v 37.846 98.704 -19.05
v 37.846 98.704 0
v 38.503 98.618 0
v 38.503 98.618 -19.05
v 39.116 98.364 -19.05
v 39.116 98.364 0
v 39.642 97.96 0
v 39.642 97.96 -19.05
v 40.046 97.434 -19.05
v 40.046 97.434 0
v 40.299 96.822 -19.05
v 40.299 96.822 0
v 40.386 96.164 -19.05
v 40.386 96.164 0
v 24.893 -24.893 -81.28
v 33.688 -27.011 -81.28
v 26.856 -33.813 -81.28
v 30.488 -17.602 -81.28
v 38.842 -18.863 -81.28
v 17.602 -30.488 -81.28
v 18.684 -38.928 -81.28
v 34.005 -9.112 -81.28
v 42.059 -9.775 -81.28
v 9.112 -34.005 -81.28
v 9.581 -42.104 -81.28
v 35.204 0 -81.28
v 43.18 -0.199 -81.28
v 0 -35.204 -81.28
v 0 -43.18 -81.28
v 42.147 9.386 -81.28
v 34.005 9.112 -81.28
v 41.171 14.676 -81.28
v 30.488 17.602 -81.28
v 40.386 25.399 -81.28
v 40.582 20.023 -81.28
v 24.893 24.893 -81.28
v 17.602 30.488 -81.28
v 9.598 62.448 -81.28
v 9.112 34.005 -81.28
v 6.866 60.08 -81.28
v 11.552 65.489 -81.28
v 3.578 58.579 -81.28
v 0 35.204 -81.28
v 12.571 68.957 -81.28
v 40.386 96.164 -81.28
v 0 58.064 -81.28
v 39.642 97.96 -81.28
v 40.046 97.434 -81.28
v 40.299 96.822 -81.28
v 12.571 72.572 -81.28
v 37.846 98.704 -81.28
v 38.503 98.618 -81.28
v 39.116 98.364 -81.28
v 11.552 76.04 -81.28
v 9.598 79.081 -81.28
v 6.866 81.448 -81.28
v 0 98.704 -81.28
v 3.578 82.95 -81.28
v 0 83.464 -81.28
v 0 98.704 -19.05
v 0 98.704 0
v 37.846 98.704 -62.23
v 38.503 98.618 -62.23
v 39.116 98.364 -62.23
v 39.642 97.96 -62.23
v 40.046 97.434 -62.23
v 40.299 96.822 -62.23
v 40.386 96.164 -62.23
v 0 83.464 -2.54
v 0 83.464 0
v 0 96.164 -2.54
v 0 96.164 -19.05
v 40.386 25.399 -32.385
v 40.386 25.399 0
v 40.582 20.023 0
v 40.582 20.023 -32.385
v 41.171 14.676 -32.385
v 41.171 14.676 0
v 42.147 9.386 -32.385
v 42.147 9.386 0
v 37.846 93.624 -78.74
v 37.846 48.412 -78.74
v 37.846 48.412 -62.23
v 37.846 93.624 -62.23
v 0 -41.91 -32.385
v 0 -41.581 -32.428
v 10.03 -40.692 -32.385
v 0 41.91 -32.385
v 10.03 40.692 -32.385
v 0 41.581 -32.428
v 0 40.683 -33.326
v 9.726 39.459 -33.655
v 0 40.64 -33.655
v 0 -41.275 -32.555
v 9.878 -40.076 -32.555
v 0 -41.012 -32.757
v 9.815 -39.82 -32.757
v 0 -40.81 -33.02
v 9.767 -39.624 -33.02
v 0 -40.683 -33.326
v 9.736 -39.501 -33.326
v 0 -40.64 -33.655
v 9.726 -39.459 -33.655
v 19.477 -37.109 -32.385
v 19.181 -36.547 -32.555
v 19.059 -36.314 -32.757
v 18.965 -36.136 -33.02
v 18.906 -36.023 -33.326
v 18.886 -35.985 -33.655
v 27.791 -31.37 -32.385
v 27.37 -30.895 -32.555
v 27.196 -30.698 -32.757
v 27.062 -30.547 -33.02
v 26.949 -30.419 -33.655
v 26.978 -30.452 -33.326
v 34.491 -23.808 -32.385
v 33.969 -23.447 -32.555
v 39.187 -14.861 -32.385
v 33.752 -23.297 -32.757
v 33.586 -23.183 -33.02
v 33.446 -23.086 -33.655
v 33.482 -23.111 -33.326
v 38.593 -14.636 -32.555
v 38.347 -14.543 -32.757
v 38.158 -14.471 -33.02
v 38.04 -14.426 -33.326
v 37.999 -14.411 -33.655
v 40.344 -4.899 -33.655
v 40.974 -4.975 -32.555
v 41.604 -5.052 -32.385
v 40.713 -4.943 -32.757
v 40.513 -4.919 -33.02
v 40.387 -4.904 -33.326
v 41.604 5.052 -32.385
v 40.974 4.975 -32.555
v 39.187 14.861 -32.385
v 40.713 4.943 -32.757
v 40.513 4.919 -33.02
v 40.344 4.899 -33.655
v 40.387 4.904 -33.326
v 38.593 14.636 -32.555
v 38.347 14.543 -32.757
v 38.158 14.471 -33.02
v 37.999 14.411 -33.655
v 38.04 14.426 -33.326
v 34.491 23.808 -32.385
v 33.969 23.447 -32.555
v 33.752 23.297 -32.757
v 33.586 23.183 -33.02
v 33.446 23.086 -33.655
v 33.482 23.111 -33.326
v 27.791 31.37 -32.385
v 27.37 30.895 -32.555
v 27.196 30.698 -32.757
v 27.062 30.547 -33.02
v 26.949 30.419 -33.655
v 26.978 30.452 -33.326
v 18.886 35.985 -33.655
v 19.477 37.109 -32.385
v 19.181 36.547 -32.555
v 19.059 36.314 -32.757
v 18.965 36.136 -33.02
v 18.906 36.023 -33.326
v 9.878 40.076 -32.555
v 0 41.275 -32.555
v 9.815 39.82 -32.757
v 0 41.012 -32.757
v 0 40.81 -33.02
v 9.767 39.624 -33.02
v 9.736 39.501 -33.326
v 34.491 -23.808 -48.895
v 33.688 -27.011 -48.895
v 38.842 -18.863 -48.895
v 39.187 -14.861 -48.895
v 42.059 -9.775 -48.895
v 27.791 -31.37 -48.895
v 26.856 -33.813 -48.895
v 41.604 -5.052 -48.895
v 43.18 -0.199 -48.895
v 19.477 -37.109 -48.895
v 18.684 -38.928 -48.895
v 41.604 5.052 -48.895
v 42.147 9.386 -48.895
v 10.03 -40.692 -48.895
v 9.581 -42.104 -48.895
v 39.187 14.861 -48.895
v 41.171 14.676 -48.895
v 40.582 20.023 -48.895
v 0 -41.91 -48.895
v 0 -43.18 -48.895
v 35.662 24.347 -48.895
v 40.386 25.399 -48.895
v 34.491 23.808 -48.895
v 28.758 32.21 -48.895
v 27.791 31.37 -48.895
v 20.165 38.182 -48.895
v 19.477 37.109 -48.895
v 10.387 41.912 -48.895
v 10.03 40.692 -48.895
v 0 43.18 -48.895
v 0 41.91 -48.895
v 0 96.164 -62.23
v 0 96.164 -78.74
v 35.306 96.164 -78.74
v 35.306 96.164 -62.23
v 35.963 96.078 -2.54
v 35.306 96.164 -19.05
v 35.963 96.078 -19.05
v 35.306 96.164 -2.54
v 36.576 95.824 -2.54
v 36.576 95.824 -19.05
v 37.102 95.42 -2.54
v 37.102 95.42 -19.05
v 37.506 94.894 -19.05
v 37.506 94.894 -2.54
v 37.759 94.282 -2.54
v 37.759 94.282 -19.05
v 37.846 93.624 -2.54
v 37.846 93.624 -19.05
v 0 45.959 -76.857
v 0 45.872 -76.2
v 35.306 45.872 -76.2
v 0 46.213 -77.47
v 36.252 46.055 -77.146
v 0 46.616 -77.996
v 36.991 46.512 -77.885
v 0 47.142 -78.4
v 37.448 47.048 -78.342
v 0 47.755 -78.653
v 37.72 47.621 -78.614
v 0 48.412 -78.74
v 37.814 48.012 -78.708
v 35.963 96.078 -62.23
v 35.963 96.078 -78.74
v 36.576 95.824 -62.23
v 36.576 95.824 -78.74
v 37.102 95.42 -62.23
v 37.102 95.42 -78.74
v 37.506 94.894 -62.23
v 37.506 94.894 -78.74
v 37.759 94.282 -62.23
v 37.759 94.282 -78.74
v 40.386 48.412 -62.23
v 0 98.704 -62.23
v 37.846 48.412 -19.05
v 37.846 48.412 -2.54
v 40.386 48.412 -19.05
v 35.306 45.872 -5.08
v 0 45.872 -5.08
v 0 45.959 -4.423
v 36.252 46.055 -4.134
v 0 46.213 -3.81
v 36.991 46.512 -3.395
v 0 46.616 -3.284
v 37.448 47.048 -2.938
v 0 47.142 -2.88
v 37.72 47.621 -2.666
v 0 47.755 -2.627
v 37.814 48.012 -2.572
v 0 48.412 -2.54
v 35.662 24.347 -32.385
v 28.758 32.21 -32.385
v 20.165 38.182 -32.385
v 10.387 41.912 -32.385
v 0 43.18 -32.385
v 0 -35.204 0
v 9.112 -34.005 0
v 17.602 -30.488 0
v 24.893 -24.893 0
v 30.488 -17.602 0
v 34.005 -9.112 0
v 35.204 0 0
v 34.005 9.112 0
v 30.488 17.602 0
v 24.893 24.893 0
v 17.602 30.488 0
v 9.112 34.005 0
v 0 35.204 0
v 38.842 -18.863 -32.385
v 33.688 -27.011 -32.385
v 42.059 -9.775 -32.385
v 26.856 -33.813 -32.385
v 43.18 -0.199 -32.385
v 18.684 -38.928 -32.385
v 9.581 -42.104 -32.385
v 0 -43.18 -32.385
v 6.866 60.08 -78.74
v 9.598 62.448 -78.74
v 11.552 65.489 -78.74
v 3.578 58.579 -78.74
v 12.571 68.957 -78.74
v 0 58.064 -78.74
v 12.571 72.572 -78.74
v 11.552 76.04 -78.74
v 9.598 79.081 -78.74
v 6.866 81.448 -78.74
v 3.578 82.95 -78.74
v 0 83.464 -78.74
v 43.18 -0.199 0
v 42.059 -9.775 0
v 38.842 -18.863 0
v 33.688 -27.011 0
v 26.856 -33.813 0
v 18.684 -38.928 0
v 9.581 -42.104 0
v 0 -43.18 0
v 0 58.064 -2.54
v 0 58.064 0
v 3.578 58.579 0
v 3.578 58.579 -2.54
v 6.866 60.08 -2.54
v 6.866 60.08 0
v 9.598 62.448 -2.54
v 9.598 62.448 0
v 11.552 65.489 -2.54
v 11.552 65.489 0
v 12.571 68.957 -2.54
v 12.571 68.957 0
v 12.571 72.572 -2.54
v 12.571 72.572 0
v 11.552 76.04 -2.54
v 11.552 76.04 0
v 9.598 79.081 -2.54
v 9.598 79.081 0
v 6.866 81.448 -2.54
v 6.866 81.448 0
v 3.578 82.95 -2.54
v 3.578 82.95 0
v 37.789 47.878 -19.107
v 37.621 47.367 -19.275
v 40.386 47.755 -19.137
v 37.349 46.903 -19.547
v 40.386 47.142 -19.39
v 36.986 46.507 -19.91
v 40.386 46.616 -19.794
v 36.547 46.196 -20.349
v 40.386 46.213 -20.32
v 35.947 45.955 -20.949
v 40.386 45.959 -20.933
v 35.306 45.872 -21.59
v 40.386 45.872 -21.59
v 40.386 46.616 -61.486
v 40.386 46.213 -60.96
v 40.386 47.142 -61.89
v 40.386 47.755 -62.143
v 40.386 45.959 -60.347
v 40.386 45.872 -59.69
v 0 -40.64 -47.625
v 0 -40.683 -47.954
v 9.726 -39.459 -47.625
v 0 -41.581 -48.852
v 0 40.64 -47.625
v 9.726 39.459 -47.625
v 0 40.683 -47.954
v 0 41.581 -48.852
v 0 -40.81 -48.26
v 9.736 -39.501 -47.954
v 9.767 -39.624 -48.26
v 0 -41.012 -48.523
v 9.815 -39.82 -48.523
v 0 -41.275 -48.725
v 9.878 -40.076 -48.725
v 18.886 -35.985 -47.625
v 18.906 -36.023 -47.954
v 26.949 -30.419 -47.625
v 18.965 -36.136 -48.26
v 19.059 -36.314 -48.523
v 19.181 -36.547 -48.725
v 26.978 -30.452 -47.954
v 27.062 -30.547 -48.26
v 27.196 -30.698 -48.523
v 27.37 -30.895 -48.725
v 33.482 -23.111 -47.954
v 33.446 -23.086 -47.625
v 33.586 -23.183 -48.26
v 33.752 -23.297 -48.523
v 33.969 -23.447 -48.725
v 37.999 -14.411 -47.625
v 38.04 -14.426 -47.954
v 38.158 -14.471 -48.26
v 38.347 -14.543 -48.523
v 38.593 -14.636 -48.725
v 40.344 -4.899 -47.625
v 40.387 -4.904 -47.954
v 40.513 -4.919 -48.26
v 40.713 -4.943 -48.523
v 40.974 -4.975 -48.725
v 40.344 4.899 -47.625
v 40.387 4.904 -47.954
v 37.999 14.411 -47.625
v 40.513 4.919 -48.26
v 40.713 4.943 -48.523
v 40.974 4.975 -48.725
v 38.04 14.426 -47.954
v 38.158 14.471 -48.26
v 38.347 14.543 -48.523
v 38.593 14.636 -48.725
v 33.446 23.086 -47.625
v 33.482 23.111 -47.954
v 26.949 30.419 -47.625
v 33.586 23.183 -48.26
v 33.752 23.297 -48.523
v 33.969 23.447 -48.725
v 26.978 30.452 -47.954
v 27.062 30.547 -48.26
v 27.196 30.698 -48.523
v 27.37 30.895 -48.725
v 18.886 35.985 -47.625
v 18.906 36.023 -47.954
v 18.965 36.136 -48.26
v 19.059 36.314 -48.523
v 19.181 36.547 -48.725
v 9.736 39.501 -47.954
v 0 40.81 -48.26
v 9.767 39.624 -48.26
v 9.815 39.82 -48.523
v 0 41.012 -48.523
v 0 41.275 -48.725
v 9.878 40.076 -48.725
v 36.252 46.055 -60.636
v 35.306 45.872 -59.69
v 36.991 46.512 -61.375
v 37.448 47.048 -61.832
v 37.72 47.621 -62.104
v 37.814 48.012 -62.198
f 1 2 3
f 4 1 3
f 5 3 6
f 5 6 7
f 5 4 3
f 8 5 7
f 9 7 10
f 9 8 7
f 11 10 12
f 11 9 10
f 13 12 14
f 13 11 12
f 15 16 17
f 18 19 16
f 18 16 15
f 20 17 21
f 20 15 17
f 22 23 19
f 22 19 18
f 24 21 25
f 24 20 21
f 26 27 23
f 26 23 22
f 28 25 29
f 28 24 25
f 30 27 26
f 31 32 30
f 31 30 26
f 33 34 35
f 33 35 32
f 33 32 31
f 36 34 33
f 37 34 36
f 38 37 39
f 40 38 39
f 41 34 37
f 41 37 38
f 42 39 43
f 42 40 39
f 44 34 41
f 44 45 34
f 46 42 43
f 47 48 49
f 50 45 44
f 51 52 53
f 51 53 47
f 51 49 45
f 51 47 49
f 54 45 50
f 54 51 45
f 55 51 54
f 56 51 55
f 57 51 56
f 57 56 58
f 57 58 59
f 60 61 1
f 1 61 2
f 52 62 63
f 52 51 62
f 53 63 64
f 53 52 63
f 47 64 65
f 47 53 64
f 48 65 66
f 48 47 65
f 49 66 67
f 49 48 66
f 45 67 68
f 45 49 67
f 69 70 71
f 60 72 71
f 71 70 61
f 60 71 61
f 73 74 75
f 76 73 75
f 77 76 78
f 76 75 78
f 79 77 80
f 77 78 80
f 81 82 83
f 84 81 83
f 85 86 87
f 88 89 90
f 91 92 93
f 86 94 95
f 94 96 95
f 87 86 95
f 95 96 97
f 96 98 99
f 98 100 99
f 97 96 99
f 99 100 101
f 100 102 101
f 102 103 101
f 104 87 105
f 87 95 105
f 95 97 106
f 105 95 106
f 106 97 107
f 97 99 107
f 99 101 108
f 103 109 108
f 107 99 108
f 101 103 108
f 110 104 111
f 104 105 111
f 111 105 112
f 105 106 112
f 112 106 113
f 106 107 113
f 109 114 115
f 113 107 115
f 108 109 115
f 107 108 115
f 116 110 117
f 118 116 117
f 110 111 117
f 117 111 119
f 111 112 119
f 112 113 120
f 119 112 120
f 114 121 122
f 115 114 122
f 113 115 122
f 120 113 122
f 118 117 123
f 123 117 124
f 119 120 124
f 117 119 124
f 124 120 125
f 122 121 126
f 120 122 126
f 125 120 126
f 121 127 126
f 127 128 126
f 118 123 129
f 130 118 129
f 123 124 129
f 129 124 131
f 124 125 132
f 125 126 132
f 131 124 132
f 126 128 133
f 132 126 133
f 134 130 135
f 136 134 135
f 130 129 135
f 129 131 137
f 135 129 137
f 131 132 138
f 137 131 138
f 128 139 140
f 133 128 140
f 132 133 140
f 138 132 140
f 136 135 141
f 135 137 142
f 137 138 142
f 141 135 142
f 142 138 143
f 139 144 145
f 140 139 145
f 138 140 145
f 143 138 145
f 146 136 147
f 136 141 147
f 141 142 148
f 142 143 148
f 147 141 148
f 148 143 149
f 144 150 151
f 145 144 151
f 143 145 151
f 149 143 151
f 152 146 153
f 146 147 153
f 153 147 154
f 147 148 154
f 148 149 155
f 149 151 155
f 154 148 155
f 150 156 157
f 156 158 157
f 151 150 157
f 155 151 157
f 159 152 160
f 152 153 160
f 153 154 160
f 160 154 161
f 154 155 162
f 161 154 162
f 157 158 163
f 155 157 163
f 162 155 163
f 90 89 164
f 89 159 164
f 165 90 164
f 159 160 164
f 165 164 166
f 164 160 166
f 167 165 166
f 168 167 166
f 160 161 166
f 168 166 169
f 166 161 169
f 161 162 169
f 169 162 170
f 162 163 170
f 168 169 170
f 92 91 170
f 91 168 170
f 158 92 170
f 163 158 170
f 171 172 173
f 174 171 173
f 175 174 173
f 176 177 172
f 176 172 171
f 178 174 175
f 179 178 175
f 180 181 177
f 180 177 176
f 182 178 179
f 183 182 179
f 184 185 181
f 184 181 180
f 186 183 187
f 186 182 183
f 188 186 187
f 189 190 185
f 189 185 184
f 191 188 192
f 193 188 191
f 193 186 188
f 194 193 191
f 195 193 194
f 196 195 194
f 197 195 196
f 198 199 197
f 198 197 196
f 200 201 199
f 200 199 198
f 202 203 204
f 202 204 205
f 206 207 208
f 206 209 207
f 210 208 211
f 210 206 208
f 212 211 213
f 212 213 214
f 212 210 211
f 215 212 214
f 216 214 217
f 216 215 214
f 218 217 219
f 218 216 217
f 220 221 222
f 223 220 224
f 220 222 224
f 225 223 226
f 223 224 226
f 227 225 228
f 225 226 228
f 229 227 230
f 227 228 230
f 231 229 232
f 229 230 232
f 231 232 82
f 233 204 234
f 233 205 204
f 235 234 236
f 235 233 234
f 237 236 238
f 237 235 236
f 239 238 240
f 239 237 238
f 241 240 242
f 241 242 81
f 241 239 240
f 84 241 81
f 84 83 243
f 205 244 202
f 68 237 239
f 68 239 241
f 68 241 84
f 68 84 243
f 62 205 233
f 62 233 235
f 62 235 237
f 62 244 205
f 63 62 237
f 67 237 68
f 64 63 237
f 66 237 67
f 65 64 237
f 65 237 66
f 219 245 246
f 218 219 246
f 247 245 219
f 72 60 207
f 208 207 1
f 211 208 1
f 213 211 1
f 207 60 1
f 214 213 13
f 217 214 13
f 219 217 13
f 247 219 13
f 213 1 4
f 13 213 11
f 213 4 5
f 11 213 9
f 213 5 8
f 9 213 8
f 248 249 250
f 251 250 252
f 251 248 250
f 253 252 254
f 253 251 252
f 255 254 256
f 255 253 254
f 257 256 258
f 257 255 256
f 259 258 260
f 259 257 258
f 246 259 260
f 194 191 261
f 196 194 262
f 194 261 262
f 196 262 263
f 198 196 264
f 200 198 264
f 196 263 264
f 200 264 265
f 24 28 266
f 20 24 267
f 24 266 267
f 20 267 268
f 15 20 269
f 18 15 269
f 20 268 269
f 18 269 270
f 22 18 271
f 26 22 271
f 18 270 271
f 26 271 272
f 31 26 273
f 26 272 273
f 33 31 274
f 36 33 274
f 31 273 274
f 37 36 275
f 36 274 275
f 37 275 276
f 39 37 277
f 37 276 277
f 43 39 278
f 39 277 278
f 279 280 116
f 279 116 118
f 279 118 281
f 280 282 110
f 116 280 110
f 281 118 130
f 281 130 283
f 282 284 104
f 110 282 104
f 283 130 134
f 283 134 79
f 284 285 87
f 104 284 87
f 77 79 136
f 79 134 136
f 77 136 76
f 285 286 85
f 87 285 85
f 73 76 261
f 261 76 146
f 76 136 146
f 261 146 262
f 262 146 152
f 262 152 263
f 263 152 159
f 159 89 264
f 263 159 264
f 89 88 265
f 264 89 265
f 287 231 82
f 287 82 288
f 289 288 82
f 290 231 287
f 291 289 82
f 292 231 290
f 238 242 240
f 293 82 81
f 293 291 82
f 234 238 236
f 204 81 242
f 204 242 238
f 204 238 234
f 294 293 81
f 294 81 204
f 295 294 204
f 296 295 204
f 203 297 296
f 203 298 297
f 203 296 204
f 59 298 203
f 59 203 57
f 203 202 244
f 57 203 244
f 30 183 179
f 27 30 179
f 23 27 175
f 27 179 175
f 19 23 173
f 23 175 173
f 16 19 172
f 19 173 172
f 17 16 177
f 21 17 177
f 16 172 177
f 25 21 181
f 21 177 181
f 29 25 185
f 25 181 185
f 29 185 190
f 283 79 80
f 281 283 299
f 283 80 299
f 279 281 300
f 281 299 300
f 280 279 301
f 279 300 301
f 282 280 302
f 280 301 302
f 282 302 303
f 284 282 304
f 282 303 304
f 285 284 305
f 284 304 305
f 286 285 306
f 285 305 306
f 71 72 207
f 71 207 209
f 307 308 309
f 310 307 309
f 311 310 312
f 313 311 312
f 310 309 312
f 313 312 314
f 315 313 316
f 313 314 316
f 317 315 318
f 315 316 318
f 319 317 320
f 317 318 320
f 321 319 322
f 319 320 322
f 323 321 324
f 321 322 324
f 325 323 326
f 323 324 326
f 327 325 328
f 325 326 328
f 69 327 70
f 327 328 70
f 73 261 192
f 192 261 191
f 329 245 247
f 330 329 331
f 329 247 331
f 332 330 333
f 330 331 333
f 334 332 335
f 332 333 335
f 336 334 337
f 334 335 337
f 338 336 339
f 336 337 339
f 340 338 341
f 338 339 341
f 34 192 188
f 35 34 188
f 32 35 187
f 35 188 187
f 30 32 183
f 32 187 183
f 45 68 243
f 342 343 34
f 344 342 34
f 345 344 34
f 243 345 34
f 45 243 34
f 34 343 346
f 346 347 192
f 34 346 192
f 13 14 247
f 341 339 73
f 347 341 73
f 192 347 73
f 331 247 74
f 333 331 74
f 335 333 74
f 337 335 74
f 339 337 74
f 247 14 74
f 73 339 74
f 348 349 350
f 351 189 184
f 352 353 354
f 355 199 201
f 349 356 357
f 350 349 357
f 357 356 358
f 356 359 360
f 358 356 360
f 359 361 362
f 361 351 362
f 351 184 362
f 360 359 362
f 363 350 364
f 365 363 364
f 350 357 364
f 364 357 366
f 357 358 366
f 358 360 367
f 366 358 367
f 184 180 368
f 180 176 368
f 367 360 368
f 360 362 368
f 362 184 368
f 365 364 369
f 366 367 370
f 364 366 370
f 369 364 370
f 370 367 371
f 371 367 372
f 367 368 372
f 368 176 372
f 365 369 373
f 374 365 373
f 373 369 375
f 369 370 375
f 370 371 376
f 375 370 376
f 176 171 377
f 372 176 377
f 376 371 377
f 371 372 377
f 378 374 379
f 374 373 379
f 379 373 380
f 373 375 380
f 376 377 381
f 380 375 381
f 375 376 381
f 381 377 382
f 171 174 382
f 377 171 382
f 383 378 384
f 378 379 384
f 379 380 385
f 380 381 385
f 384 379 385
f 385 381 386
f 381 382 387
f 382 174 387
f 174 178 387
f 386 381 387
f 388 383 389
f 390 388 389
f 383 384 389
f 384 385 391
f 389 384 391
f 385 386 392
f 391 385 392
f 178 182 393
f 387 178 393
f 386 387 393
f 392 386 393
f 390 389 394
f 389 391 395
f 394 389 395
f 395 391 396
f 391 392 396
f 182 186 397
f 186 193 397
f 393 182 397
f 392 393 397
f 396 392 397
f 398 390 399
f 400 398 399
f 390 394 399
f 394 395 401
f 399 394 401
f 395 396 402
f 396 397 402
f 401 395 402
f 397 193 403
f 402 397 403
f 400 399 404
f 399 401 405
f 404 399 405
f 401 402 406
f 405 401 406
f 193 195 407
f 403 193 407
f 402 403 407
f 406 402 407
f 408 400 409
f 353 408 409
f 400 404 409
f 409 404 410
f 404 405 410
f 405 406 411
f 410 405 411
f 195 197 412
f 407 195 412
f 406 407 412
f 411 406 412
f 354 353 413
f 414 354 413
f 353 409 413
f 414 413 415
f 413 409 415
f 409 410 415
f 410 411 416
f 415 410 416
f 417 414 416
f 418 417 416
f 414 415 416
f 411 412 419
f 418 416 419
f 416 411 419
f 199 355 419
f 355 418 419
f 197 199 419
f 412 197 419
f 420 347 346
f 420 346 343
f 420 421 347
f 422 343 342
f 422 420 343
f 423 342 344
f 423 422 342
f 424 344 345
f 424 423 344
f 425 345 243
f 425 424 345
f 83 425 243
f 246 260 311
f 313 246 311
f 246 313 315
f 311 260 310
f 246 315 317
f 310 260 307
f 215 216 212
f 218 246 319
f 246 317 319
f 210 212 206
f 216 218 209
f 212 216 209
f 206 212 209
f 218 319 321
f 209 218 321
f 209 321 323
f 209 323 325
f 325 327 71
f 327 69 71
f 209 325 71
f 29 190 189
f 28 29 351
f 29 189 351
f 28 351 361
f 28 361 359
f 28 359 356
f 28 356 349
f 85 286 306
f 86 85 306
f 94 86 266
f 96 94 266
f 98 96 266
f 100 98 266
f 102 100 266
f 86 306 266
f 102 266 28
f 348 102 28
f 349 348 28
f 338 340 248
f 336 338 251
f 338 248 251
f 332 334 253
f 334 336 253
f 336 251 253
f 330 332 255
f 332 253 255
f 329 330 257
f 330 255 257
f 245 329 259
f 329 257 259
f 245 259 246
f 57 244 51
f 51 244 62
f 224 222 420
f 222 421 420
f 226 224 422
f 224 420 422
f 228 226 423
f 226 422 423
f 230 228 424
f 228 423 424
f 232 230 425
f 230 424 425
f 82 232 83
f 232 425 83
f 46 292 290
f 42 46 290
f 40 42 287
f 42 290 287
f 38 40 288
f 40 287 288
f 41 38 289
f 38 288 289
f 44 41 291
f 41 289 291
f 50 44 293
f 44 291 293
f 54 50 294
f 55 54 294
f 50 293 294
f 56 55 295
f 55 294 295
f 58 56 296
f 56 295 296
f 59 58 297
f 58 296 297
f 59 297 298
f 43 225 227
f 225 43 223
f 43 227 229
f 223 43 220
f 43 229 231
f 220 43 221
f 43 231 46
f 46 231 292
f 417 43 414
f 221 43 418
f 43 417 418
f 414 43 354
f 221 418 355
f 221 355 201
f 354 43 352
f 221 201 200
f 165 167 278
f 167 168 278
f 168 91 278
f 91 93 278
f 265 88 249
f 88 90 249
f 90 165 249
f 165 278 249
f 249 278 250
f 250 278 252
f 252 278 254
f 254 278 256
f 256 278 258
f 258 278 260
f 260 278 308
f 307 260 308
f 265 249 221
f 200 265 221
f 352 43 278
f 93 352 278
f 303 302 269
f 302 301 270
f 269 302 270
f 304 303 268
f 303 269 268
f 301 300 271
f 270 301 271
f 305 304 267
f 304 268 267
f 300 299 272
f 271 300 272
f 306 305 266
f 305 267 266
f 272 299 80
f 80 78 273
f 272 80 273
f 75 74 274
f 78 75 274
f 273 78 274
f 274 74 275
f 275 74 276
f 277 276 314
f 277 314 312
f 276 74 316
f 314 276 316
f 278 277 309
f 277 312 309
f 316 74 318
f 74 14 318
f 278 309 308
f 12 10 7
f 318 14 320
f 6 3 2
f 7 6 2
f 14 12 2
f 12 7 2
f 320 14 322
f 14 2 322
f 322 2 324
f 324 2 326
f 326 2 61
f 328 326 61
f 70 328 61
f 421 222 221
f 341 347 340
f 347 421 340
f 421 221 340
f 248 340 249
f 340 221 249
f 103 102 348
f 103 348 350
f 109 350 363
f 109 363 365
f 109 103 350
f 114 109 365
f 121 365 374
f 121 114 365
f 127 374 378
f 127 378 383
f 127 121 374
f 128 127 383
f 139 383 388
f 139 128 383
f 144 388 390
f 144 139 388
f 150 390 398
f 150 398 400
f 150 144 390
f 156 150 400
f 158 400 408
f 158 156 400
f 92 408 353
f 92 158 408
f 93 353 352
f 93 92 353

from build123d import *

# Parameters (mm, degrees)
BOSS_EXTRUDE1_DEPTH            = 81.28
SKETCH3_W                      = 76.2
SKETCH3_H                      = 50.292
CUT_EXTRUDE1_DEPTH             = 37.846
SKETCH4_W                      = 40.386
SKETCH4_H                      = 43.18
CUT_EXTRUDE2_DEPTH             = 52.832
FILLET1_R                      = 2.54
FILLET2_R                      = 2.54
FILLET3_R                      = 2.54
FILLET4_R                      = 2.54
SKETCH7_W                      = 16.51
SKETCH7_H                      = 2.54
CUT_EXTRUDE4_REACH             = 54.566
SKETCH8_W                      = 16.51
SKETCH8_H                      = 16.012242806
CUT_EXTRUDE4_DIRECTION_2_DEPTH = 2.54
FILLET5_R                      = 1.27


with BuildPart() as part:
    # Sketch1 → Boss-Extrude1 (new body)
    with BuildSketch(Plane.XY):
        with BuildLine():
            Line((0, 52.9844), (0, 58.0644))
            ThreePointArc((0, 58.0644), (12.7, 70.7644), (0, 83.4644))
            Line((0, 83.4644), (0, 98.7044))
            Line((0, 98.7044), (40.386, 98.7044))
            Line((40.386, 98.7044), (40.386, 25.398729968))
            ThreePointArc((40.386, 25.398729968), (40.827682914, 17.344312358), (42.147434783, 9.386487162))
            ThreePointArc((42.147434783, 9.386487162), (33.688432107, -27.011144777), (0, -43.18))
            Line((0, -43.18), (0, -35.2044))
            ThreePointArc((0, -35.2044), (35.2044, 0), (0, 35.2044))
            Line((0, 35.2044), (0, 52.9844))
        make_face()
    extrude(amount=-BOSS_EXTRUDE1_DEPTH)

    # Sketch3 → Cut-Extrude1 (cut)
    with BuildSketch(Plane.ZY):
        with Locations((-40.64, 71.0184)):
            Rectangle(SKETCH3_W, SKETCH3_H)
    extrude(amount=-CUT_EXTRUDE1_DEPTH, mode=Mode.SUBTRACT)

    # Sketch4 → Cut-Extrude2 (cut)
    with BuildSketch(Plane(origin=(0, 98.7044, 0), x_dir=(1, 0, 0), z_dir=(0, 1, 0))):
        with Locations((20.193, 40.64)):
            Rectangle(SKETCH4_W, SKETCH4_H)
    extrude(amount=-CUT_EXTRUDE2_DEPTH, mode=Mode.SUBTRACT)

    # Fillet1
    fillet1_edges = [part.edges().sort_by_distance(p)[0] for p in [
        (18.923, 45.8724, -78.74),
        (18.923, 45.8724, -2.54),
        (37.846, 45.8724, -10.795),
        (37.846, 45.8724, -70.485),
    ]]
    fillet(fillet1_edges, radius=FILLET1_R)

    # Fillet2
    fillet2_edges = [part.edges().sort_by_distance(p)[0] for p in [
        (37.846, 96.1644, -70.485),
        (37.846, 96.1644, -10.795),
    ]]
    fillet(fillet2_edges, radius=FILLET2_R)

    # Fillet3
    fillet3_edges = [part.edges().sort_by_distance(p)[0] for p in [
        (36.576, 45.8724, -19.05),
        (36.576, 45.8724, -62.23),
    ]]
    fillet(fillet3_edges, radius=FILLET3_R)

    # Fillet4
    fillet4_edges = [part.edges().sort_by_distance(p)[0] for p in [
        (40.386, 98.7044, -71.755),
        (40.386, 98.7044, -9.525),
    ]]
    fillet(fillet4_edges, radius=FILLET4_R)

    # Sketch7 → Cut-Revolve2 (revolve, cut)
    with BuildSketch(Plane.ZY):
        with Locations((-40.64, -41.91)):
            Rectangle(SKETCH7_W, SKETCH7_H)
    revolve(axis=Axis((0, 0, -81.28), (0, 0, 1)), mode=Mode.SUBTRACT)

    # Sketch8 → Cut-Extrude4 (cut, up to next)
    with BuildSketch(Plane(origin=(42.147434783, 9.386487162, 0), x_dir=(0, 0, -1), z_dir=(0.976086957, 0.217380435, 0)), mode=Mode.PRIVATE) as cut_extrude4_sk1:
        with Locations((40.64, 8.006121403)):
            Rectangle(SKETCH8_W, SKETCH8_H)
    cut_extrude4_tool1 = extrude(cut_extrude4_sk1.sketch, amount=-CUT_EXTRUDE4_REACH, mode=Mode.PRIVATE) & part.part
    add(cut_extrude4_tool1.solids().sort_by_distance((40.407061, 17.201158, -40.64))[0], mode=Mode.SUBTRACT)

    # Sketch8 → Cut-Extrude4 direction 2 (cut)
    with BuildSketch(Plane(origin=(42.147434783, 9.386487162, 0), x_dir=(0, 0, -1), z_dir=(0.976086957, 0.217380435, 0))):
        with Locations((40.64, 8.006121403)):
            Rectangle(SKETCH8_W, SKETCH8_H)
    extrude(amount=CUT_EXTRUDE4_DIRECTION_2_DEPTH, mode=Mode.SUBTRACT)

    # Fillet5
    fillet5_edges = [part.edges().sort_by_distance(p)[0] for p in [
        (40.64, 0, -48.895),
        (40.64, 0, -32.385),
    ]]
    fillet(fillet5_edges, radius=FILLET5_R)


solid = part.part
